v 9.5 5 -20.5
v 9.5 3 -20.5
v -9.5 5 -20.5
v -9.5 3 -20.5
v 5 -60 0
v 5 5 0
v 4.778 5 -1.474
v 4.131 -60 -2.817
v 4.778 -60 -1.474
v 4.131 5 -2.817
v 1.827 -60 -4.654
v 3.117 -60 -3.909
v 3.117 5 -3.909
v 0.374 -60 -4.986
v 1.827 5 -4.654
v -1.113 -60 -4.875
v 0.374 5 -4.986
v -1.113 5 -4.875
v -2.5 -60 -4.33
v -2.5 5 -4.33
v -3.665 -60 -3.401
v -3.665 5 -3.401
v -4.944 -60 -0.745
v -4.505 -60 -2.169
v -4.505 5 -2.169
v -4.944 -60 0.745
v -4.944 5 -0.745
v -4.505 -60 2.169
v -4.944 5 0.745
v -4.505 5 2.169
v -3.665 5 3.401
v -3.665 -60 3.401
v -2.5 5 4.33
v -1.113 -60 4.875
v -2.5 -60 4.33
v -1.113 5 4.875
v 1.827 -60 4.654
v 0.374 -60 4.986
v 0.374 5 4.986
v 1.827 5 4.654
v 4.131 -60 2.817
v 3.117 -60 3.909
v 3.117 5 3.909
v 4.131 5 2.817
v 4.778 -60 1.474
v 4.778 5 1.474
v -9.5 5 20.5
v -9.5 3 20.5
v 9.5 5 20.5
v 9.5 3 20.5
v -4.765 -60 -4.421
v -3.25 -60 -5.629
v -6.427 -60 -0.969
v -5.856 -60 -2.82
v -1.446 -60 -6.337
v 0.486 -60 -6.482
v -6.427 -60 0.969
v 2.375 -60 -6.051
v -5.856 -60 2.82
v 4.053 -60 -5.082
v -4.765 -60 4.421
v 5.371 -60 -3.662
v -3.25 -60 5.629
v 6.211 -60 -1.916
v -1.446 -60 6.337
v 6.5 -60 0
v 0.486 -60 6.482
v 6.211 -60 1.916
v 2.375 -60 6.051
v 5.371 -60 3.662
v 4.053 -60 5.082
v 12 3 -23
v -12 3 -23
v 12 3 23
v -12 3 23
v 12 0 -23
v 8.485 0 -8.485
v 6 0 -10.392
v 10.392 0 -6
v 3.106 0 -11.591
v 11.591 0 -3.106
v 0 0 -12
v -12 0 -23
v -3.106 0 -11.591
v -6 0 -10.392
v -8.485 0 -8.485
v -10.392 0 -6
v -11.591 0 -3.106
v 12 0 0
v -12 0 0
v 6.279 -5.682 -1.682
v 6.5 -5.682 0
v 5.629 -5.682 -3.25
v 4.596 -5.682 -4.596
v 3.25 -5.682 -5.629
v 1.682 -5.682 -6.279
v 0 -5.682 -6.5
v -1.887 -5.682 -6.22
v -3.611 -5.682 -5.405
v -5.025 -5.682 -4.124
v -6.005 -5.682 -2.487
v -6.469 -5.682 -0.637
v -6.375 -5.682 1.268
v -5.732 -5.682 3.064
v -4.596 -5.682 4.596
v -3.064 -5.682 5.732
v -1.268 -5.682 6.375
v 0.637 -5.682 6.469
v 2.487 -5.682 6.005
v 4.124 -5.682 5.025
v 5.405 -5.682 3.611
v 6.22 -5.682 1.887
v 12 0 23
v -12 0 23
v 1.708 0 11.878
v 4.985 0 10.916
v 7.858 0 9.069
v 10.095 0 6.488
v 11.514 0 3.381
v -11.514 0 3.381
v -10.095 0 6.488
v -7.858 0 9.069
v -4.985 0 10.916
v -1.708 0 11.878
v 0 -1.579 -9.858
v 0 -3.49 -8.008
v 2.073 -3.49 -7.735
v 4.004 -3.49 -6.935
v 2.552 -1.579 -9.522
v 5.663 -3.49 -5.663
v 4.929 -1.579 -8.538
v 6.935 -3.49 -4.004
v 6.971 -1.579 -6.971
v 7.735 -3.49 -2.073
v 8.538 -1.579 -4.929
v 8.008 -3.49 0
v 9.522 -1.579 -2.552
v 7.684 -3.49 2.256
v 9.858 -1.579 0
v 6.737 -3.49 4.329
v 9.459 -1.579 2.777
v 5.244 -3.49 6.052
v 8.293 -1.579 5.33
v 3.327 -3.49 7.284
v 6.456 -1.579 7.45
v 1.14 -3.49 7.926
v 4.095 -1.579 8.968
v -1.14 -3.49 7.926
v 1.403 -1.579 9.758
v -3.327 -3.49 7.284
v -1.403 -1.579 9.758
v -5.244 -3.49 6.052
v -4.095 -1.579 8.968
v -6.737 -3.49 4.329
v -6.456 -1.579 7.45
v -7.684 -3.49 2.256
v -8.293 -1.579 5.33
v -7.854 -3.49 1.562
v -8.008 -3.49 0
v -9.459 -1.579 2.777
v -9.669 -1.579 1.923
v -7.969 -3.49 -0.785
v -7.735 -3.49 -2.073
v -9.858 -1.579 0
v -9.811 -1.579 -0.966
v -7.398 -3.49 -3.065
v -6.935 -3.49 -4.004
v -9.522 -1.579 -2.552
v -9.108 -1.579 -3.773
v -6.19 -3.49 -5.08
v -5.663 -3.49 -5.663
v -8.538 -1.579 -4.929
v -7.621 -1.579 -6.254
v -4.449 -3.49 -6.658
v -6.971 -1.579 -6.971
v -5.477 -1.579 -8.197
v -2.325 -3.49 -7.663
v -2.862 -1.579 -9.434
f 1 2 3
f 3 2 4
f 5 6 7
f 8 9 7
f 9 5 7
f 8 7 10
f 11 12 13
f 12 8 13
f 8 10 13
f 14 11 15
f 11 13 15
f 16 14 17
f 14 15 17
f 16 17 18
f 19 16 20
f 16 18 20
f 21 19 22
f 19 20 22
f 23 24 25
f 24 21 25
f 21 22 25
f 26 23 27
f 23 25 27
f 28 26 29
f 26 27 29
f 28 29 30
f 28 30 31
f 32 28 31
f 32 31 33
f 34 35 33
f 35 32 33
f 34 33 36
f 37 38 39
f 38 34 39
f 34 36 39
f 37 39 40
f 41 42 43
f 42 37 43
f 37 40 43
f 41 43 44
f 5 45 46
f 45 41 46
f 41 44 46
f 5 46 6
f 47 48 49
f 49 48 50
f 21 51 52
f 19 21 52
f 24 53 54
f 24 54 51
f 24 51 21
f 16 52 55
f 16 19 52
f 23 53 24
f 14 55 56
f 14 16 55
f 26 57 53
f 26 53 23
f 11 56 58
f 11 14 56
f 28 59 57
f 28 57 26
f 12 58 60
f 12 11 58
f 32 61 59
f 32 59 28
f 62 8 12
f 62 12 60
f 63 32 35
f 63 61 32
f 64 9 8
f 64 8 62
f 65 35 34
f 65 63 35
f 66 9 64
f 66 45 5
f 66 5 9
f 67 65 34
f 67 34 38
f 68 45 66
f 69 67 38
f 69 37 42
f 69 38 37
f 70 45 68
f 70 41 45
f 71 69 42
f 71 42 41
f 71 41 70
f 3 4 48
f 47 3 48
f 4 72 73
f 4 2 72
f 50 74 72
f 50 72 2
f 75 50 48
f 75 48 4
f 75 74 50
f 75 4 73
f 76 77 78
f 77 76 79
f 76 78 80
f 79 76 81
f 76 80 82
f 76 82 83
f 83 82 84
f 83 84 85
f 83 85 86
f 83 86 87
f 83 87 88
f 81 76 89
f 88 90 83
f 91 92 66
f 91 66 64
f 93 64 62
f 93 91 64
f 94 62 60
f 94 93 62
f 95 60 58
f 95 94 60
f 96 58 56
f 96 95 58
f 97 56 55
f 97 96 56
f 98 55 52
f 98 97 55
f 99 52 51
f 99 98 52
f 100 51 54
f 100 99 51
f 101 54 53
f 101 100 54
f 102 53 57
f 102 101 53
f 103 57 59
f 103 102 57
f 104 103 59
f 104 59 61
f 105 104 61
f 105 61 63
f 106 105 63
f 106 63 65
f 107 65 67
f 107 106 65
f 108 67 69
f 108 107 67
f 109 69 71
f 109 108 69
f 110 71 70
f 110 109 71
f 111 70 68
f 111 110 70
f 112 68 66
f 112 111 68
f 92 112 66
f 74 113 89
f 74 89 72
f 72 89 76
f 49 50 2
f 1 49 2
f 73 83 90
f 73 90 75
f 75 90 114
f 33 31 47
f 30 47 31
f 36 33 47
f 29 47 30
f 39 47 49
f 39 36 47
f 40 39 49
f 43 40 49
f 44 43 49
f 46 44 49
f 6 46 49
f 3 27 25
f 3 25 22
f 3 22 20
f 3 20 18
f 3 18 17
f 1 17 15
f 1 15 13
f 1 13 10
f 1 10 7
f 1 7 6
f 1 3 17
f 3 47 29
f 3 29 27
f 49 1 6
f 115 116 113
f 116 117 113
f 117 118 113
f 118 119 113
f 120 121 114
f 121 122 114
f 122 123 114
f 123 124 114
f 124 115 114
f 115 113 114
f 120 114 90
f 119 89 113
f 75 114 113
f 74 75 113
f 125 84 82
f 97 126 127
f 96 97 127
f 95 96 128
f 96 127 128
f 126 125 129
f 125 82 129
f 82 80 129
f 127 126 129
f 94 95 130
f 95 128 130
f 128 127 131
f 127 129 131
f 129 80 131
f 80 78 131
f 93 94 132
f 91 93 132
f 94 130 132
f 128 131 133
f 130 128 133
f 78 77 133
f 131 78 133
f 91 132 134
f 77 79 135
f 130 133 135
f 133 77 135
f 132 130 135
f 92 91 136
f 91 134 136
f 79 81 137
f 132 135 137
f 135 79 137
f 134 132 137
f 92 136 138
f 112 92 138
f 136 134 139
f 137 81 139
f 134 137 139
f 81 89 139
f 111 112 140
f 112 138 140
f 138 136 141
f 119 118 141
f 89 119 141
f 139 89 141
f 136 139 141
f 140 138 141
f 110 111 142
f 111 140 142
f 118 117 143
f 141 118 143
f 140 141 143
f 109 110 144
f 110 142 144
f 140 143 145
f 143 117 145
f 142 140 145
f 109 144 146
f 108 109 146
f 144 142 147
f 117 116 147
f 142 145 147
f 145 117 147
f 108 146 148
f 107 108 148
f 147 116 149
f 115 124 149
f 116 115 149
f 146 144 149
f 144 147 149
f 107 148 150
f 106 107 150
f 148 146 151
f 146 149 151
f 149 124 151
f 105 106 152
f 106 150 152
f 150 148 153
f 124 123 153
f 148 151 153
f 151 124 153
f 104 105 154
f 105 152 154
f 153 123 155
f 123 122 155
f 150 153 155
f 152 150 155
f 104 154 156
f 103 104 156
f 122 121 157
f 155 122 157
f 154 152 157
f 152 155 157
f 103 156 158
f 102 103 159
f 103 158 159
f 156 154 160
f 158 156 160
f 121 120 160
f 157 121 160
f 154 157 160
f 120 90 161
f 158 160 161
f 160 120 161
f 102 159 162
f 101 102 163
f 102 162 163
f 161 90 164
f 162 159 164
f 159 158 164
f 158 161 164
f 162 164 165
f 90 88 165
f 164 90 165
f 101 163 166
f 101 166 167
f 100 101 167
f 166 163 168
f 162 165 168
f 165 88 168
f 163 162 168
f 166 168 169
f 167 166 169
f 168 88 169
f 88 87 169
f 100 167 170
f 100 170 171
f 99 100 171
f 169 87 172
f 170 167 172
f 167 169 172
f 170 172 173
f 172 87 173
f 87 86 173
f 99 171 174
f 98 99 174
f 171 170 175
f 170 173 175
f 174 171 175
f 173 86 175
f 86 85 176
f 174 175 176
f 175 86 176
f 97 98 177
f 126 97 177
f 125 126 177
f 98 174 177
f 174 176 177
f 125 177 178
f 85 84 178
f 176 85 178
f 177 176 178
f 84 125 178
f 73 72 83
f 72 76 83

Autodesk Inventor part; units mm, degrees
ref_plane "YZ Plane" through (0, 0, 0) normal (1, 0, 0) x (0, 1, 0)
ref_plane "XZ Plane" through (0, 0, 0) normal (0, 1, 0) x (-1, 0, 0)
ref_plane "XY Plane" through (0, 0, 0) normal (0, 0, 1) x (1, 0, 0)
sketch "Esboço1" plane through (0, 0, 0) normal (0, 1, 0) x (-1, 0, 0)
  line L0 (12, 23) -> (-12, 23)
  line L1 (-12, 23) -> (-12, -23)
  line L2 (-12, -23) -> (12, -23)
  line L3 (12, -23) -> (12, 23)
  line L4 (12, 23) -> (-12, -23) construction
  line L5 (-12, 23) -> (12, -23) construction
  point P0 (0, 0)
  dimension "d0" = 24
  dimension "d1" = 46
extrude "Base" add sketch "Esboço1" along normal blind 3
sketch "Esboço2" plane through (0, 3, 0) normal (0, 1, 0) x (1, 0, 0)
  line L0 (-9.5, -20.5) -> (9.5, -20.5)
  line L1 (9.5, -20.5) -> (9.5, 20.5)
  line L2 (9.5, 20.5) -> (-9.5, 20.5)
  line L3 (-9.5, 20.5) -> (-9.5, -20.5)
  line L4 (-9.5, -20.5) -> (9.5, 20.5) construction
  line L5 (9.5, -20.5) -> (-9.5, 20.5) construction
  line L6 (-12, 23) -> (-12, -23) projected
  point P0 (0, 0)
  dimension "d4" = 19
  dimension "d5" = 41
extrude "Encaixe" add sketch "Esboço2" along normal blind 2
sketch "Esboço3" plane through (0, 0, 0) normal (0, -1, 0) x (1, 0, 0)
  circle A0 centre (0, 0) radius 6.5
  circle A1 centre (0, 0) radius 5
  dimension "d9" = 13
  dimension "d10" = 10
extrude "Furo" cut sketch "Esboço3" against normal up to surface (5 mm away) contours A1
extrude "Haste" add sketch "Esboço3" along normal blind 60
ref_plane "Plano de trabalho1" through (0, 0, -23) normal (-1, 0, 0) x (0, 0, 1)
sketch "Esboço5" plane through (0, 0, -23) normal (-1, 0, 0) x (0, 0, 1)
  line L0 (17.4096, -19.7038) -> (17.4096, 1.7927)
  line L1 (46, 0) -> (0, 0) projected
  line L2 (28, -60) -> (28, 5) projected
  arc A0 (17.4096, -19.7038) -> (11, 0) centre (2.6099, -13.6237) ccw
  line L3 (23, -21.6532) -> (23, 7.4929)
  line L4 (0, 0) -> (46, 0) projected
  point P0 (23, 0)
  point P1 (26.9955, 0)
  point P2 (23, 0)
  point P3 (23, 0)
  point P4 (17.4096, -7.5437)
  point P5 (17.4096, 0)
  dimension "d25" = 16
  dimension "d27" = 12
revolve "Revolução1" add sketch "Esboço5" angle 360 about axis through (0, -21.6532, 0) along (0, 1, 0) contours A0 L1 L0
properties part number "Tampa Eletroimã"
